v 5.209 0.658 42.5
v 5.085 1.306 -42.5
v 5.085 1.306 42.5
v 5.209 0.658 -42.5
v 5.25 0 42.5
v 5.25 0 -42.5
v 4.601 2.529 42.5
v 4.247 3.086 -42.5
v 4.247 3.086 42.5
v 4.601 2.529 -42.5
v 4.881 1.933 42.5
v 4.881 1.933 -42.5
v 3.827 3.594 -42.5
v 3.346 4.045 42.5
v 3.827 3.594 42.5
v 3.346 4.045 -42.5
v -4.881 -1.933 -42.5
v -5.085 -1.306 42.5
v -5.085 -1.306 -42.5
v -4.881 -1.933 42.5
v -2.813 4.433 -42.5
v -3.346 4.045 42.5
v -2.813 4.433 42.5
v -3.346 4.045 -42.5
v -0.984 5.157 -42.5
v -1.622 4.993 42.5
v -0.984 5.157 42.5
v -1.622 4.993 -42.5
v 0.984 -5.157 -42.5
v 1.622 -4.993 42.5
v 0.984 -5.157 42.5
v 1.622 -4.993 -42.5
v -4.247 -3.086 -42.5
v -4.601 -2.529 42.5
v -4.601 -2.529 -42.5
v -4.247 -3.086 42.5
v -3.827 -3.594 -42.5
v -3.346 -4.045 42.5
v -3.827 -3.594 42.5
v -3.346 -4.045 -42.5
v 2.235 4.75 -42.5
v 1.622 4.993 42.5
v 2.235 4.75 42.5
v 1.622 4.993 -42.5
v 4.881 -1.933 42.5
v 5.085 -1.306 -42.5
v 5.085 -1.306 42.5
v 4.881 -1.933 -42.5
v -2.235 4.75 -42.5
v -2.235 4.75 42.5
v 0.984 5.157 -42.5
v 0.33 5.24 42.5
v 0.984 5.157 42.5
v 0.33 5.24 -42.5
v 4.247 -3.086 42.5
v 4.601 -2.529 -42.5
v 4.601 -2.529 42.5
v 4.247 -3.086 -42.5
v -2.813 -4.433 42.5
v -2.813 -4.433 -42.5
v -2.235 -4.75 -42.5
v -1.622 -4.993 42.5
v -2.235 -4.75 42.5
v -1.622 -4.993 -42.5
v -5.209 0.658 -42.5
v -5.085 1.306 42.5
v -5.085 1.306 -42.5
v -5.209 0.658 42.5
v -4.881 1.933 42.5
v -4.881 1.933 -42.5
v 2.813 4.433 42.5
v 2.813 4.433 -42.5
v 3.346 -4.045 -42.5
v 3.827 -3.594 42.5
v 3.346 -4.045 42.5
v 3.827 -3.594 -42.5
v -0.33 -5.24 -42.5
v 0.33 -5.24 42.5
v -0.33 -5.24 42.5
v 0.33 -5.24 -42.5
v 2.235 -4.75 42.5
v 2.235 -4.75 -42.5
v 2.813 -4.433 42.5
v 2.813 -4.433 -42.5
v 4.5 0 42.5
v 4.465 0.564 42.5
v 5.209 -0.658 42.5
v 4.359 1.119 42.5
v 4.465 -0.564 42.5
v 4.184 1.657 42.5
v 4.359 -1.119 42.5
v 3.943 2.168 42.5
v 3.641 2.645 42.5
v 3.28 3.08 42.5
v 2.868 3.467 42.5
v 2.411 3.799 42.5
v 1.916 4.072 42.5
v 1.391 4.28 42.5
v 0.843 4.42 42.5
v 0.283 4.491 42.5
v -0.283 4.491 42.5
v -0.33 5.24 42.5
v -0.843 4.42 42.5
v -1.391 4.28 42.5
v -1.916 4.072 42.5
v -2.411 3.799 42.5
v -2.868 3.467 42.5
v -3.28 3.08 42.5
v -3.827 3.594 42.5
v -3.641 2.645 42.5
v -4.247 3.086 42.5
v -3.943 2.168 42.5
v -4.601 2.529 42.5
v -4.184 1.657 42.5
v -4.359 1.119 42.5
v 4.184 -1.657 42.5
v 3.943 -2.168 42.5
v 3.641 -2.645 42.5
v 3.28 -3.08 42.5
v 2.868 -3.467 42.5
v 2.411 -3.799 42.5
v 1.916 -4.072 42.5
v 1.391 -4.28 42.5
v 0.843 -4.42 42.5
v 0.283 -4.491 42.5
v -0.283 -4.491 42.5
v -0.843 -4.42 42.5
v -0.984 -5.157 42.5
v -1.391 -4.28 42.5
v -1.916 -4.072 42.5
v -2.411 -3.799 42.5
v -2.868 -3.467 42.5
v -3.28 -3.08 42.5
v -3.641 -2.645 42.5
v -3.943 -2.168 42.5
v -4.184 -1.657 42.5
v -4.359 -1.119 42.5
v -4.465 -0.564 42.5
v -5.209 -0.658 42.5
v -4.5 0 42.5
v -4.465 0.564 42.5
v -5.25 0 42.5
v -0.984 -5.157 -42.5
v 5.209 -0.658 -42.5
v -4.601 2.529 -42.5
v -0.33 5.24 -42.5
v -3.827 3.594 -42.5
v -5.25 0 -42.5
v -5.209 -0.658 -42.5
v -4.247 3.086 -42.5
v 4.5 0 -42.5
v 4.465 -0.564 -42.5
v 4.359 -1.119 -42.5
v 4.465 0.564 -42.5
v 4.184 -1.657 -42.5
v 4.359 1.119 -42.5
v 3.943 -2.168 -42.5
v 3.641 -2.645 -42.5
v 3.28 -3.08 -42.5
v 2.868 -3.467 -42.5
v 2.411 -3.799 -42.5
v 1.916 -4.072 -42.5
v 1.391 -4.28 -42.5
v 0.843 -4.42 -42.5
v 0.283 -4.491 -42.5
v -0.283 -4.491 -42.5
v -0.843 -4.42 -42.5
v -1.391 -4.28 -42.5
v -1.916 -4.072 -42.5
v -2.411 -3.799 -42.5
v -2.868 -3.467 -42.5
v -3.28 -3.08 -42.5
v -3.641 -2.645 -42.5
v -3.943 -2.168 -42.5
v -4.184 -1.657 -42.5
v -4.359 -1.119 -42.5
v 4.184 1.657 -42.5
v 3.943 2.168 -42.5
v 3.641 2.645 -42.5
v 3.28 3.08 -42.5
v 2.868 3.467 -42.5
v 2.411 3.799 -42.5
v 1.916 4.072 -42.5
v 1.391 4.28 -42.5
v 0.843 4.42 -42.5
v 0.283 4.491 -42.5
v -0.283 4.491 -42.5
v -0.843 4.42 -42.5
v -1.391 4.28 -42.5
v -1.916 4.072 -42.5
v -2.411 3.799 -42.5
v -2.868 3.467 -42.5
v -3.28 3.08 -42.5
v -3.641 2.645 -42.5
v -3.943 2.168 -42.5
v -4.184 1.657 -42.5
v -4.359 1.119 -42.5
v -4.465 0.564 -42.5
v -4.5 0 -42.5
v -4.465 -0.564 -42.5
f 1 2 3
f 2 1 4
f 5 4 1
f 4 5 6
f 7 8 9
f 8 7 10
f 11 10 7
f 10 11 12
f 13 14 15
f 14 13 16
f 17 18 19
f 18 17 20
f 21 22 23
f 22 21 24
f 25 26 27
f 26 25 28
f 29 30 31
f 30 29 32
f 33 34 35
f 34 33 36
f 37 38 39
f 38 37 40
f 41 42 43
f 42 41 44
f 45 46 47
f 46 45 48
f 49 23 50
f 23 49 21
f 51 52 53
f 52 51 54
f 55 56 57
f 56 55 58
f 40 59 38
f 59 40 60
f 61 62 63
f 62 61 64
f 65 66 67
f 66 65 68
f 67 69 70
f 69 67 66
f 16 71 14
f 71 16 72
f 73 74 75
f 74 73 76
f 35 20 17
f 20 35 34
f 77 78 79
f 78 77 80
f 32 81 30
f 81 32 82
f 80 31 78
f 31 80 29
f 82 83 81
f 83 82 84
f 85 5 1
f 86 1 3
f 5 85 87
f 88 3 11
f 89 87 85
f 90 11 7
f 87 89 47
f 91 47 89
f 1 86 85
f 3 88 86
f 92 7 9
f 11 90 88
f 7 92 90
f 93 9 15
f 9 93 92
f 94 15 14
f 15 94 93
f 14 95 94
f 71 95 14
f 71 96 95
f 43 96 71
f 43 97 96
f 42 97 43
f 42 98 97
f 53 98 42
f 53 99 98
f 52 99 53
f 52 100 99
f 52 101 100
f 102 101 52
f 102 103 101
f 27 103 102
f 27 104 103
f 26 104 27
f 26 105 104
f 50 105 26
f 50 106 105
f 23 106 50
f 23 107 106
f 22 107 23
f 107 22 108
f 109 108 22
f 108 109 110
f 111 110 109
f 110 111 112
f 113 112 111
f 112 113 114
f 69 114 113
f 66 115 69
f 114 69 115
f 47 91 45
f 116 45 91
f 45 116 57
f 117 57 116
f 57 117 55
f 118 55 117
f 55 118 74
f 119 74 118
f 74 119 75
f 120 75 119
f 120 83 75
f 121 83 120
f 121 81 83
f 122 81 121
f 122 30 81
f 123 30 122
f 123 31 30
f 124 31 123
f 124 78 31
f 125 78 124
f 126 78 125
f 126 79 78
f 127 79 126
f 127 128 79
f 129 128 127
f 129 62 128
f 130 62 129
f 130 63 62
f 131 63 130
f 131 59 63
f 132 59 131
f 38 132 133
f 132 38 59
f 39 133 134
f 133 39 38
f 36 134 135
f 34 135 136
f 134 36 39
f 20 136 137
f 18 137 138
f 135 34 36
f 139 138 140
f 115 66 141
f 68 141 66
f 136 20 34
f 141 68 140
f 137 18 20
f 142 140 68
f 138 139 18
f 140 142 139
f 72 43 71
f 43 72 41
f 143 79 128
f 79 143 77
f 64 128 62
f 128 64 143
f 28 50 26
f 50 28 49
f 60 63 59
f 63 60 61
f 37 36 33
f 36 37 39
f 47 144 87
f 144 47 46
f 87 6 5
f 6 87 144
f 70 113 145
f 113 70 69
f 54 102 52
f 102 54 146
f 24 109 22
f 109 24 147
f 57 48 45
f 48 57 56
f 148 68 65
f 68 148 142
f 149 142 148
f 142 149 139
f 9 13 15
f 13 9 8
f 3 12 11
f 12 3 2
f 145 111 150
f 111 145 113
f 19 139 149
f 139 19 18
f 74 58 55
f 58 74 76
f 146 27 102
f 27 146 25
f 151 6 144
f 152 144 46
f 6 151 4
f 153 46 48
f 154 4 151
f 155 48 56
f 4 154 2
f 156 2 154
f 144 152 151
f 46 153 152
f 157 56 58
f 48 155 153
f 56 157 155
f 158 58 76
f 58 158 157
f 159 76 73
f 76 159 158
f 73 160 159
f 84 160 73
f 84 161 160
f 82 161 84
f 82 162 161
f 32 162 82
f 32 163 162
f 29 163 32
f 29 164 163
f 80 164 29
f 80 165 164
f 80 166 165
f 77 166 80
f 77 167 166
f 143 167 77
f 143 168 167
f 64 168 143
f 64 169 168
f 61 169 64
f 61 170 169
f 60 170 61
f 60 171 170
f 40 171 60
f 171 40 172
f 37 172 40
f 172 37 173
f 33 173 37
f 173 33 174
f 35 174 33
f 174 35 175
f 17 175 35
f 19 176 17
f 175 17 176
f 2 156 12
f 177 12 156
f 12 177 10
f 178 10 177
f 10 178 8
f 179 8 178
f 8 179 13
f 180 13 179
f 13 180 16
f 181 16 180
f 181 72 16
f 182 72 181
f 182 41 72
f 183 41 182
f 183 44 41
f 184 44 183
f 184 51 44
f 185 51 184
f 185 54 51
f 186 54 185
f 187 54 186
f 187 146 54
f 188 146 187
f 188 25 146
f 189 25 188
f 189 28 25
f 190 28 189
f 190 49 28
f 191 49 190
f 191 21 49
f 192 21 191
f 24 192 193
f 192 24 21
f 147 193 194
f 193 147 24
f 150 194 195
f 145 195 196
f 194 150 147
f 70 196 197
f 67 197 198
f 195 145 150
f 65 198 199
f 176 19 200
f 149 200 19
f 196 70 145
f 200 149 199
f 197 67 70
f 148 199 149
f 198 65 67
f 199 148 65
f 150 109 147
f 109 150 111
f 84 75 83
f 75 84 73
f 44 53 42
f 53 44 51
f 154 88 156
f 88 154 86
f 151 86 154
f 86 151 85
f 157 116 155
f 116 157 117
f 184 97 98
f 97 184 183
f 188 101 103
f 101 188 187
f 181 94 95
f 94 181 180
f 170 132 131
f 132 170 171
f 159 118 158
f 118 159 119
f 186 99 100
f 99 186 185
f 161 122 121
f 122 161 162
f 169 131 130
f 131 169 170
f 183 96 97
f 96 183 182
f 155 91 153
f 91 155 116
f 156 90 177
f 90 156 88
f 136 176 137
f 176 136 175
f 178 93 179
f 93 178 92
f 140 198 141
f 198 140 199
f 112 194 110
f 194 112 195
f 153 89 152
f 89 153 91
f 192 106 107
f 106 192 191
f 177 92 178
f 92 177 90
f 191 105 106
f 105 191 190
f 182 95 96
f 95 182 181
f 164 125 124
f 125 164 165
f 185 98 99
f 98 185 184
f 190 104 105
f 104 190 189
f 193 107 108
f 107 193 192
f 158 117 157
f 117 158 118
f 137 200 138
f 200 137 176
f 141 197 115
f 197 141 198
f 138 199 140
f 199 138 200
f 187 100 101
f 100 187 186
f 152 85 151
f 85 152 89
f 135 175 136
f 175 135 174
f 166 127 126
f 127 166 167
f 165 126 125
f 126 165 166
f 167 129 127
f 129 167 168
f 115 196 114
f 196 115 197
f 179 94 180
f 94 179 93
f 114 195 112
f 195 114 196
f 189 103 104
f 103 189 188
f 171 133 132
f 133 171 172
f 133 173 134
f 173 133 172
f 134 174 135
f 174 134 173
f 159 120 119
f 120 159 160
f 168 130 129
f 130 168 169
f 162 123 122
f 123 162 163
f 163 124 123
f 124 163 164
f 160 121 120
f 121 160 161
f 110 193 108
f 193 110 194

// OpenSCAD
$fn = 50;


difference() {
	union() {
		translate(v = [0, 0, -42.5000000000]) {
			cylinder(h = 85, r = 5.2500000000);
		}
	}
	union() {
		translate(v = [0, 0, -100.0000000000]) {
			cylinder(h = 200, r = 4.5000000000);
		}
	}
}
